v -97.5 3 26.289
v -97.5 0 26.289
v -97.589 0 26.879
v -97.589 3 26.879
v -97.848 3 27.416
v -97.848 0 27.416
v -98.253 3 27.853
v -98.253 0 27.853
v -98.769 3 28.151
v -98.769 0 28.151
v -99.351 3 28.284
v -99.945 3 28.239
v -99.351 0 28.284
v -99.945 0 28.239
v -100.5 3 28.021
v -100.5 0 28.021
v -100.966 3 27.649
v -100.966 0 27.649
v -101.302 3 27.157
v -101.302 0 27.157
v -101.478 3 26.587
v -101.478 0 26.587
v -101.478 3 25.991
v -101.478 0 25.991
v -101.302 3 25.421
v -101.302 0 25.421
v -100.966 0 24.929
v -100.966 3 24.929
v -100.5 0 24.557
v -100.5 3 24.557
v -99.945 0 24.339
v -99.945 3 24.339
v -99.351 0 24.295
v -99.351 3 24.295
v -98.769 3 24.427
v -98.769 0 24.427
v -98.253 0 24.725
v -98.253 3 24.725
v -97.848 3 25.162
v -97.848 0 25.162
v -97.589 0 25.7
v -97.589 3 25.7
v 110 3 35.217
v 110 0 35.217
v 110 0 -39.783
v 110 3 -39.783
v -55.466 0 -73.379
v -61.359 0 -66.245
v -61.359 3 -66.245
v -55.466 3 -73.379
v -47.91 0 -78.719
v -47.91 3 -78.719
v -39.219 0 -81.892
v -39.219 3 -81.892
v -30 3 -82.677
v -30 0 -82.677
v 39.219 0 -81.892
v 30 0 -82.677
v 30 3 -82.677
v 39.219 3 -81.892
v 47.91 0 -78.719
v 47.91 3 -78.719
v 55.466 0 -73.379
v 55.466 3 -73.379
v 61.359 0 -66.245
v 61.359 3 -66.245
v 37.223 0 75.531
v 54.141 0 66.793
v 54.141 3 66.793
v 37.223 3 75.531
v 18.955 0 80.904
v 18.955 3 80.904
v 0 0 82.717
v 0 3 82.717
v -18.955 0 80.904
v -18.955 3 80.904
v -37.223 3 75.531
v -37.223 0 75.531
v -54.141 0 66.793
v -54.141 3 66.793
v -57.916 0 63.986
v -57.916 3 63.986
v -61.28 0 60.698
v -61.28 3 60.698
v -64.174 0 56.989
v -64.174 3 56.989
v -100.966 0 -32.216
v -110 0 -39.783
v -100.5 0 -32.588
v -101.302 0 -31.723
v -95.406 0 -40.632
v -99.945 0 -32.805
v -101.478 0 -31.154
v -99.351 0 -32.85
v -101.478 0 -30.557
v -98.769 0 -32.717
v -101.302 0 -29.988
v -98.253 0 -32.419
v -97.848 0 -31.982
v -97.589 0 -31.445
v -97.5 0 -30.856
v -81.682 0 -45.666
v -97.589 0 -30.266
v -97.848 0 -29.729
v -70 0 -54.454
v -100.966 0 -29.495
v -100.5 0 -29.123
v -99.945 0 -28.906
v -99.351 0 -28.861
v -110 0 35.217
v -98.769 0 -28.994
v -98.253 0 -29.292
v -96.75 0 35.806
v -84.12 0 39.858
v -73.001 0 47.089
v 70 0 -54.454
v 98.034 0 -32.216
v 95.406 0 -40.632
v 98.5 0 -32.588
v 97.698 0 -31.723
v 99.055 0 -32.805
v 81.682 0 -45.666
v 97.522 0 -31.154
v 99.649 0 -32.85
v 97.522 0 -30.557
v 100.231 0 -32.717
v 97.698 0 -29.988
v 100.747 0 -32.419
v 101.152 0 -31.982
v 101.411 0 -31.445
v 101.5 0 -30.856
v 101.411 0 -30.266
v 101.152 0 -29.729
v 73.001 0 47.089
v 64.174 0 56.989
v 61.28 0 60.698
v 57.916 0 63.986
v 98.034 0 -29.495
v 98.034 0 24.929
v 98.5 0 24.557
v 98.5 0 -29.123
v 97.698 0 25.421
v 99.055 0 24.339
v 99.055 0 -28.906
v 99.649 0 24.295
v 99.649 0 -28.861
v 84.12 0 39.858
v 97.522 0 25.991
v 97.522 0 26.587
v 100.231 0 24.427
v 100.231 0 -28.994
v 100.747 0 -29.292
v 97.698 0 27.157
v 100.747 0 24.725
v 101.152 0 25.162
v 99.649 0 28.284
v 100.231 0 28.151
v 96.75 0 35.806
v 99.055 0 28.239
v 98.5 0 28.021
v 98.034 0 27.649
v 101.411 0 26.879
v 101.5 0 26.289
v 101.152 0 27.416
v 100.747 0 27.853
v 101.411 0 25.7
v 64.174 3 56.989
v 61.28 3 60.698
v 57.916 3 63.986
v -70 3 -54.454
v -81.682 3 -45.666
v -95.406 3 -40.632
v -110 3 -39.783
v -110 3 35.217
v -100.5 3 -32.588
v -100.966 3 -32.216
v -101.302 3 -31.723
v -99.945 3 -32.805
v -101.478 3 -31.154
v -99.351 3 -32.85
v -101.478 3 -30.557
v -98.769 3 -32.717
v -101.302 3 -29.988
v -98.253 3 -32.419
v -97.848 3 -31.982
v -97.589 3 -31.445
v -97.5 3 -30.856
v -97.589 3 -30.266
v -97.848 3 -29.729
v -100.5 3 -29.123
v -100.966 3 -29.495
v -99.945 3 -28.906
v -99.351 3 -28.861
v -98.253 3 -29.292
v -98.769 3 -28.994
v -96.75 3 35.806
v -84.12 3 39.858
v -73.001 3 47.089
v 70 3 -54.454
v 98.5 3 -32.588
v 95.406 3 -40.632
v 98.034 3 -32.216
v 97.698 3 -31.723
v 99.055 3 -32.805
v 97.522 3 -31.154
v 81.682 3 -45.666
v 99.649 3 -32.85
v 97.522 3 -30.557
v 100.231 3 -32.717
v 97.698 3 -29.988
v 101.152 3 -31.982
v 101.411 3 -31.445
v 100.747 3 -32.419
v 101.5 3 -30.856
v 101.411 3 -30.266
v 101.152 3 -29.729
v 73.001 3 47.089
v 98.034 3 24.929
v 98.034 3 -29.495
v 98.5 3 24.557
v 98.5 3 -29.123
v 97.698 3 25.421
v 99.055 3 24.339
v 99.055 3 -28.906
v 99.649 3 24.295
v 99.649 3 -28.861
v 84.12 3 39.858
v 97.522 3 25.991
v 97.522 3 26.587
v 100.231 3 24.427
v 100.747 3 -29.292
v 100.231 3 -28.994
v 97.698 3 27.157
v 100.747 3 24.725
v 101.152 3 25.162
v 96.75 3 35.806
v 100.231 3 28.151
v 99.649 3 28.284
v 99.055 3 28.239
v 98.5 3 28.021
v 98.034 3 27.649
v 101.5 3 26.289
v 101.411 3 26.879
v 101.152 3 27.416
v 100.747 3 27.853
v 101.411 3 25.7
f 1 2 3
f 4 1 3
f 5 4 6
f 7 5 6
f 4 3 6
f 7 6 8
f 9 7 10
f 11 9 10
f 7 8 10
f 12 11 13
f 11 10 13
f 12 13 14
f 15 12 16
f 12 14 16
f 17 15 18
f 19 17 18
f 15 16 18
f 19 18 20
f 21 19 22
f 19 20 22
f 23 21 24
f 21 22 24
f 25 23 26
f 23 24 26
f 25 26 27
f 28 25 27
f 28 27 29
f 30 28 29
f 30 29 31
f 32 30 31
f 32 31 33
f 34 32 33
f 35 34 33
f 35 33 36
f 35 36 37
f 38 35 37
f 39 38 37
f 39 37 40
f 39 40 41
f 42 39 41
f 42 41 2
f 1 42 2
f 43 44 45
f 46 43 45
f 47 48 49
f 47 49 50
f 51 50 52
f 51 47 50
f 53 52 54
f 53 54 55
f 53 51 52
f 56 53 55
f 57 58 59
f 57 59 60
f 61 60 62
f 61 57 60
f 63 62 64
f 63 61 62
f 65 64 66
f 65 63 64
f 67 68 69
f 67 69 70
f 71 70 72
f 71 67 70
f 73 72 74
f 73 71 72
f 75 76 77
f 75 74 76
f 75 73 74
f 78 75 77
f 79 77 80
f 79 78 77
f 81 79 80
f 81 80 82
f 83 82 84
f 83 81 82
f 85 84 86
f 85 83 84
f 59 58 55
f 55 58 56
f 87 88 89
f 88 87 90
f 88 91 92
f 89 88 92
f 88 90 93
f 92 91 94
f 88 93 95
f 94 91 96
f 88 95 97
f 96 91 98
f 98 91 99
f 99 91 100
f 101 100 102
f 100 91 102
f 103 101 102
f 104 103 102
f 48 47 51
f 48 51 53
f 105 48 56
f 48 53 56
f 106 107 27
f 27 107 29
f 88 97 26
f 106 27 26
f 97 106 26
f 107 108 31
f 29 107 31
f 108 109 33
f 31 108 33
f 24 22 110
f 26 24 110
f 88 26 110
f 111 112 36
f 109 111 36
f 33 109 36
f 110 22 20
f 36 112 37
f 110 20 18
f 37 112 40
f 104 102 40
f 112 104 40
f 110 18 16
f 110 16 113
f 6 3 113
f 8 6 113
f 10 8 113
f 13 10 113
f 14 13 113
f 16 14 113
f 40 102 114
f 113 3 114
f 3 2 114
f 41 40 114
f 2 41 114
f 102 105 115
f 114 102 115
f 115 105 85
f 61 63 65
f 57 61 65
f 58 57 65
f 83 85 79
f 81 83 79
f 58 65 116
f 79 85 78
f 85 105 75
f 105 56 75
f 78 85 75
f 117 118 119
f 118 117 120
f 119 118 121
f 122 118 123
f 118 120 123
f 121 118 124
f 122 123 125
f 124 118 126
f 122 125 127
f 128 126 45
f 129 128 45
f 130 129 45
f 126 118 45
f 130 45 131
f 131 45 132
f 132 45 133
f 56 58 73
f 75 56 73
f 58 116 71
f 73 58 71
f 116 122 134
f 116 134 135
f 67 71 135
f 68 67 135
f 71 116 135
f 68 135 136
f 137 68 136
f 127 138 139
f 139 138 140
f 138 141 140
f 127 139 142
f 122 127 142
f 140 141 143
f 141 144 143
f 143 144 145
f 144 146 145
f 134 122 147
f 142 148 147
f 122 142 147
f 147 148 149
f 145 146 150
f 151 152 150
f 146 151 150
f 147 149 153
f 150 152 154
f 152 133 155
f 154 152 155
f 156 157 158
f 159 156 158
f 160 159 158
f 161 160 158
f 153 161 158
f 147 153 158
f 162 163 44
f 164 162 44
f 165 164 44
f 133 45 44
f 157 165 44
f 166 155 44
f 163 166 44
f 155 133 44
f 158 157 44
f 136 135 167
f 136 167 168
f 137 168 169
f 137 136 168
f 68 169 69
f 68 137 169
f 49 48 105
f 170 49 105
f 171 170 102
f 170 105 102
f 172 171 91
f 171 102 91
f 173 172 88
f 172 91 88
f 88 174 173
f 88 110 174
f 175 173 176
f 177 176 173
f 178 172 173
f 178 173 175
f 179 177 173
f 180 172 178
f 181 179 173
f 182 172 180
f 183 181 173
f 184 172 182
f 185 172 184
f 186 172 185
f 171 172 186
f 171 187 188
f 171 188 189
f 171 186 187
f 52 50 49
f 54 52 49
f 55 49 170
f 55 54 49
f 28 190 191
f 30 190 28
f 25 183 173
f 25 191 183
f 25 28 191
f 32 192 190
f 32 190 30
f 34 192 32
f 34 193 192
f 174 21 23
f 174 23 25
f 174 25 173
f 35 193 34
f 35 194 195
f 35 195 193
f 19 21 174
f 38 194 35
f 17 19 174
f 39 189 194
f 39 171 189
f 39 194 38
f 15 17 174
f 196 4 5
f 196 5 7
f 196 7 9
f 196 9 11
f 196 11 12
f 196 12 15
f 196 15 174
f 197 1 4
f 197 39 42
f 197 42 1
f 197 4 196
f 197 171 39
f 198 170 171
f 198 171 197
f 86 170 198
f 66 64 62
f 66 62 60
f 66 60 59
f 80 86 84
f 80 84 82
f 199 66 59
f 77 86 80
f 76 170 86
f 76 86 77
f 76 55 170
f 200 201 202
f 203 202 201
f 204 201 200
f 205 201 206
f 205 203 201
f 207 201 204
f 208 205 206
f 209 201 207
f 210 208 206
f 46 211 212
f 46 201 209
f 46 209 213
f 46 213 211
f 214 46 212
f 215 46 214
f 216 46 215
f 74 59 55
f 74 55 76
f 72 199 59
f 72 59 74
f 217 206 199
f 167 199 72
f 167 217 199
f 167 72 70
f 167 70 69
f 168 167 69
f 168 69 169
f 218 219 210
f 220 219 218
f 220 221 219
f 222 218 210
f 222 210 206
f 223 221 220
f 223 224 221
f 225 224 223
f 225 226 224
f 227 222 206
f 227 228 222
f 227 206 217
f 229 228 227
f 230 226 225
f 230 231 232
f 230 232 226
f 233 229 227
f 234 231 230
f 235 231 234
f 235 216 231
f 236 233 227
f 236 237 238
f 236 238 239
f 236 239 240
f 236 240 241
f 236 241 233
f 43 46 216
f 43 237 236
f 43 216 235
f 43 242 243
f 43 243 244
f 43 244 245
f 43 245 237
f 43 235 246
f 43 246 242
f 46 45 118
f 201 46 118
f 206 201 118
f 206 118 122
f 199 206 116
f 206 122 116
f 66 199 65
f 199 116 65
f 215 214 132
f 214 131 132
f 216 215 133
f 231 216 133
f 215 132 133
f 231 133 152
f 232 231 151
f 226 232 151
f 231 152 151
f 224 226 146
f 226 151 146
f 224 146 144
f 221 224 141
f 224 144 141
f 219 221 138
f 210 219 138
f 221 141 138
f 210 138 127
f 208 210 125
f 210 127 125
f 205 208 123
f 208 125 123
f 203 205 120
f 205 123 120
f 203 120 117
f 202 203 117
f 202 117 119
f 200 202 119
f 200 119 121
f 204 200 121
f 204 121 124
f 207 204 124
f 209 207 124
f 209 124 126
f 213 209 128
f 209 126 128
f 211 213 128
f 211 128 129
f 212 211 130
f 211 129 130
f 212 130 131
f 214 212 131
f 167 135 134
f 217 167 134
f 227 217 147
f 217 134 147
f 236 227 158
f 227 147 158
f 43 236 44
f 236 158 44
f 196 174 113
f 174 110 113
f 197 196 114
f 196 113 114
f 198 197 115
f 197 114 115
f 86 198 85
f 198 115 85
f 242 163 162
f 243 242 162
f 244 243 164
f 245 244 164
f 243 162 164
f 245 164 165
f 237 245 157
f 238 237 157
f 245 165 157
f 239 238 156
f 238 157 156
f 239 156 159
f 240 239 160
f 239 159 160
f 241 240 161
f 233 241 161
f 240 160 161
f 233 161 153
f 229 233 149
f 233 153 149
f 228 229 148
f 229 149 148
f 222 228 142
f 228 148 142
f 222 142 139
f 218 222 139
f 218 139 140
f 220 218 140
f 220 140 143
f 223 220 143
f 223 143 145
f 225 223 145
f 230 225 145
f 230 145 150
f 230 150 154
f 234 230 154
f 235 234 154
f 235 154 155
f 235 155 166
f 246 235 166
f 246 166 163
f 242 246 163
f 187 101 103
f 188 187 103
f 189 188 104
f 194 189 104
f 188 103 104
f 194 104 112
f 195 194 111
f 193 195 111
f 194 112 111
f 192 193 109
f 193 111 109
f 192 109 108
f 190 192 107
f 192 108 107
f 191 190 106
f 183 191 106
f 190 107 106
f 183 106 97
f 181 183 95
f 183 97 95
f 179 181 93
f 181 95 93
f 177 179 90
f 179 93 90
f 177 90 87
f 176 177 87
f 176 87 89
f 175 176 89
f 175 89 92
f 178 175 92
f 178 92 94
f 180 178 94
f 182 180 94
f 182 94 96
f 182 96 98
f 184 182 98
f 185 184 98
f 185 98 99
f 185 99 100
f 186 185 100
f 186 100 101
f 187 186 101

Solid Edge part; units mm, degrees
sketch "Sketch1" plane through (0, 0, 0) normal (0, -1, 0) x (1, 0, 0)
  arc A0 (-110, 35.2168) -> (-64.1736, 56.9886) centre (-105.5765, 85.0207) ccw
  arc A1 (-64.1736, 56.9886) -> (-54.1409, 66.7927) centre (-35.1916, 37.3662) cw
  arc A2 (-54.1409, 66.7927) -> (54.1409, 66.7927) centre (0, -17.2832) cw
  arc A3 (54.1409, 66.7927) -> (64.1736, 56.9886) centre (35.1916, 37.3662) cw
  arc A4 (64.1736, 56.9886) -> (110, 35.2168) centre (105.5765, 85.0207) ccw
  line L0 (110, 35.2168) -> (110, -39.7832)
  arc A5 (110, -39.7832) -> (61.3593, -66.2455) centre (105.5765, -89.5871) ccw
  arc A6 (61.3593, -66.2455) -> (30, -82.6771) centre (31.666, -47.7168) cw
  line L1 (30, -82.6771) -> (-30, -82.6771)
  arc A7 (-61.3593, -66.2455) -> (-30, -82.6771) centre (-31.666, -47.7168) ccw
  arc A8 (-110, -39.7832) -> (-61.3593, -66.2455) centre (-105.5765, -89.5871) cw
  line L2 (-110, 35.2168) -> (-110, -39.7832)
  circle A9 centre (-99.5, 26.2891) radius 2
  circle A10 centre (-99.5, -30.8555) radius 2
  circle A11 centre (99.5, 26.2891) radius 2
  circle A12 centre (99.5, -30.8555) radius 2
extrude "Extrusionsausprägung_2" add sketch "Sketch1" against normal blind 3
properties material "Nylon, allgemein"
